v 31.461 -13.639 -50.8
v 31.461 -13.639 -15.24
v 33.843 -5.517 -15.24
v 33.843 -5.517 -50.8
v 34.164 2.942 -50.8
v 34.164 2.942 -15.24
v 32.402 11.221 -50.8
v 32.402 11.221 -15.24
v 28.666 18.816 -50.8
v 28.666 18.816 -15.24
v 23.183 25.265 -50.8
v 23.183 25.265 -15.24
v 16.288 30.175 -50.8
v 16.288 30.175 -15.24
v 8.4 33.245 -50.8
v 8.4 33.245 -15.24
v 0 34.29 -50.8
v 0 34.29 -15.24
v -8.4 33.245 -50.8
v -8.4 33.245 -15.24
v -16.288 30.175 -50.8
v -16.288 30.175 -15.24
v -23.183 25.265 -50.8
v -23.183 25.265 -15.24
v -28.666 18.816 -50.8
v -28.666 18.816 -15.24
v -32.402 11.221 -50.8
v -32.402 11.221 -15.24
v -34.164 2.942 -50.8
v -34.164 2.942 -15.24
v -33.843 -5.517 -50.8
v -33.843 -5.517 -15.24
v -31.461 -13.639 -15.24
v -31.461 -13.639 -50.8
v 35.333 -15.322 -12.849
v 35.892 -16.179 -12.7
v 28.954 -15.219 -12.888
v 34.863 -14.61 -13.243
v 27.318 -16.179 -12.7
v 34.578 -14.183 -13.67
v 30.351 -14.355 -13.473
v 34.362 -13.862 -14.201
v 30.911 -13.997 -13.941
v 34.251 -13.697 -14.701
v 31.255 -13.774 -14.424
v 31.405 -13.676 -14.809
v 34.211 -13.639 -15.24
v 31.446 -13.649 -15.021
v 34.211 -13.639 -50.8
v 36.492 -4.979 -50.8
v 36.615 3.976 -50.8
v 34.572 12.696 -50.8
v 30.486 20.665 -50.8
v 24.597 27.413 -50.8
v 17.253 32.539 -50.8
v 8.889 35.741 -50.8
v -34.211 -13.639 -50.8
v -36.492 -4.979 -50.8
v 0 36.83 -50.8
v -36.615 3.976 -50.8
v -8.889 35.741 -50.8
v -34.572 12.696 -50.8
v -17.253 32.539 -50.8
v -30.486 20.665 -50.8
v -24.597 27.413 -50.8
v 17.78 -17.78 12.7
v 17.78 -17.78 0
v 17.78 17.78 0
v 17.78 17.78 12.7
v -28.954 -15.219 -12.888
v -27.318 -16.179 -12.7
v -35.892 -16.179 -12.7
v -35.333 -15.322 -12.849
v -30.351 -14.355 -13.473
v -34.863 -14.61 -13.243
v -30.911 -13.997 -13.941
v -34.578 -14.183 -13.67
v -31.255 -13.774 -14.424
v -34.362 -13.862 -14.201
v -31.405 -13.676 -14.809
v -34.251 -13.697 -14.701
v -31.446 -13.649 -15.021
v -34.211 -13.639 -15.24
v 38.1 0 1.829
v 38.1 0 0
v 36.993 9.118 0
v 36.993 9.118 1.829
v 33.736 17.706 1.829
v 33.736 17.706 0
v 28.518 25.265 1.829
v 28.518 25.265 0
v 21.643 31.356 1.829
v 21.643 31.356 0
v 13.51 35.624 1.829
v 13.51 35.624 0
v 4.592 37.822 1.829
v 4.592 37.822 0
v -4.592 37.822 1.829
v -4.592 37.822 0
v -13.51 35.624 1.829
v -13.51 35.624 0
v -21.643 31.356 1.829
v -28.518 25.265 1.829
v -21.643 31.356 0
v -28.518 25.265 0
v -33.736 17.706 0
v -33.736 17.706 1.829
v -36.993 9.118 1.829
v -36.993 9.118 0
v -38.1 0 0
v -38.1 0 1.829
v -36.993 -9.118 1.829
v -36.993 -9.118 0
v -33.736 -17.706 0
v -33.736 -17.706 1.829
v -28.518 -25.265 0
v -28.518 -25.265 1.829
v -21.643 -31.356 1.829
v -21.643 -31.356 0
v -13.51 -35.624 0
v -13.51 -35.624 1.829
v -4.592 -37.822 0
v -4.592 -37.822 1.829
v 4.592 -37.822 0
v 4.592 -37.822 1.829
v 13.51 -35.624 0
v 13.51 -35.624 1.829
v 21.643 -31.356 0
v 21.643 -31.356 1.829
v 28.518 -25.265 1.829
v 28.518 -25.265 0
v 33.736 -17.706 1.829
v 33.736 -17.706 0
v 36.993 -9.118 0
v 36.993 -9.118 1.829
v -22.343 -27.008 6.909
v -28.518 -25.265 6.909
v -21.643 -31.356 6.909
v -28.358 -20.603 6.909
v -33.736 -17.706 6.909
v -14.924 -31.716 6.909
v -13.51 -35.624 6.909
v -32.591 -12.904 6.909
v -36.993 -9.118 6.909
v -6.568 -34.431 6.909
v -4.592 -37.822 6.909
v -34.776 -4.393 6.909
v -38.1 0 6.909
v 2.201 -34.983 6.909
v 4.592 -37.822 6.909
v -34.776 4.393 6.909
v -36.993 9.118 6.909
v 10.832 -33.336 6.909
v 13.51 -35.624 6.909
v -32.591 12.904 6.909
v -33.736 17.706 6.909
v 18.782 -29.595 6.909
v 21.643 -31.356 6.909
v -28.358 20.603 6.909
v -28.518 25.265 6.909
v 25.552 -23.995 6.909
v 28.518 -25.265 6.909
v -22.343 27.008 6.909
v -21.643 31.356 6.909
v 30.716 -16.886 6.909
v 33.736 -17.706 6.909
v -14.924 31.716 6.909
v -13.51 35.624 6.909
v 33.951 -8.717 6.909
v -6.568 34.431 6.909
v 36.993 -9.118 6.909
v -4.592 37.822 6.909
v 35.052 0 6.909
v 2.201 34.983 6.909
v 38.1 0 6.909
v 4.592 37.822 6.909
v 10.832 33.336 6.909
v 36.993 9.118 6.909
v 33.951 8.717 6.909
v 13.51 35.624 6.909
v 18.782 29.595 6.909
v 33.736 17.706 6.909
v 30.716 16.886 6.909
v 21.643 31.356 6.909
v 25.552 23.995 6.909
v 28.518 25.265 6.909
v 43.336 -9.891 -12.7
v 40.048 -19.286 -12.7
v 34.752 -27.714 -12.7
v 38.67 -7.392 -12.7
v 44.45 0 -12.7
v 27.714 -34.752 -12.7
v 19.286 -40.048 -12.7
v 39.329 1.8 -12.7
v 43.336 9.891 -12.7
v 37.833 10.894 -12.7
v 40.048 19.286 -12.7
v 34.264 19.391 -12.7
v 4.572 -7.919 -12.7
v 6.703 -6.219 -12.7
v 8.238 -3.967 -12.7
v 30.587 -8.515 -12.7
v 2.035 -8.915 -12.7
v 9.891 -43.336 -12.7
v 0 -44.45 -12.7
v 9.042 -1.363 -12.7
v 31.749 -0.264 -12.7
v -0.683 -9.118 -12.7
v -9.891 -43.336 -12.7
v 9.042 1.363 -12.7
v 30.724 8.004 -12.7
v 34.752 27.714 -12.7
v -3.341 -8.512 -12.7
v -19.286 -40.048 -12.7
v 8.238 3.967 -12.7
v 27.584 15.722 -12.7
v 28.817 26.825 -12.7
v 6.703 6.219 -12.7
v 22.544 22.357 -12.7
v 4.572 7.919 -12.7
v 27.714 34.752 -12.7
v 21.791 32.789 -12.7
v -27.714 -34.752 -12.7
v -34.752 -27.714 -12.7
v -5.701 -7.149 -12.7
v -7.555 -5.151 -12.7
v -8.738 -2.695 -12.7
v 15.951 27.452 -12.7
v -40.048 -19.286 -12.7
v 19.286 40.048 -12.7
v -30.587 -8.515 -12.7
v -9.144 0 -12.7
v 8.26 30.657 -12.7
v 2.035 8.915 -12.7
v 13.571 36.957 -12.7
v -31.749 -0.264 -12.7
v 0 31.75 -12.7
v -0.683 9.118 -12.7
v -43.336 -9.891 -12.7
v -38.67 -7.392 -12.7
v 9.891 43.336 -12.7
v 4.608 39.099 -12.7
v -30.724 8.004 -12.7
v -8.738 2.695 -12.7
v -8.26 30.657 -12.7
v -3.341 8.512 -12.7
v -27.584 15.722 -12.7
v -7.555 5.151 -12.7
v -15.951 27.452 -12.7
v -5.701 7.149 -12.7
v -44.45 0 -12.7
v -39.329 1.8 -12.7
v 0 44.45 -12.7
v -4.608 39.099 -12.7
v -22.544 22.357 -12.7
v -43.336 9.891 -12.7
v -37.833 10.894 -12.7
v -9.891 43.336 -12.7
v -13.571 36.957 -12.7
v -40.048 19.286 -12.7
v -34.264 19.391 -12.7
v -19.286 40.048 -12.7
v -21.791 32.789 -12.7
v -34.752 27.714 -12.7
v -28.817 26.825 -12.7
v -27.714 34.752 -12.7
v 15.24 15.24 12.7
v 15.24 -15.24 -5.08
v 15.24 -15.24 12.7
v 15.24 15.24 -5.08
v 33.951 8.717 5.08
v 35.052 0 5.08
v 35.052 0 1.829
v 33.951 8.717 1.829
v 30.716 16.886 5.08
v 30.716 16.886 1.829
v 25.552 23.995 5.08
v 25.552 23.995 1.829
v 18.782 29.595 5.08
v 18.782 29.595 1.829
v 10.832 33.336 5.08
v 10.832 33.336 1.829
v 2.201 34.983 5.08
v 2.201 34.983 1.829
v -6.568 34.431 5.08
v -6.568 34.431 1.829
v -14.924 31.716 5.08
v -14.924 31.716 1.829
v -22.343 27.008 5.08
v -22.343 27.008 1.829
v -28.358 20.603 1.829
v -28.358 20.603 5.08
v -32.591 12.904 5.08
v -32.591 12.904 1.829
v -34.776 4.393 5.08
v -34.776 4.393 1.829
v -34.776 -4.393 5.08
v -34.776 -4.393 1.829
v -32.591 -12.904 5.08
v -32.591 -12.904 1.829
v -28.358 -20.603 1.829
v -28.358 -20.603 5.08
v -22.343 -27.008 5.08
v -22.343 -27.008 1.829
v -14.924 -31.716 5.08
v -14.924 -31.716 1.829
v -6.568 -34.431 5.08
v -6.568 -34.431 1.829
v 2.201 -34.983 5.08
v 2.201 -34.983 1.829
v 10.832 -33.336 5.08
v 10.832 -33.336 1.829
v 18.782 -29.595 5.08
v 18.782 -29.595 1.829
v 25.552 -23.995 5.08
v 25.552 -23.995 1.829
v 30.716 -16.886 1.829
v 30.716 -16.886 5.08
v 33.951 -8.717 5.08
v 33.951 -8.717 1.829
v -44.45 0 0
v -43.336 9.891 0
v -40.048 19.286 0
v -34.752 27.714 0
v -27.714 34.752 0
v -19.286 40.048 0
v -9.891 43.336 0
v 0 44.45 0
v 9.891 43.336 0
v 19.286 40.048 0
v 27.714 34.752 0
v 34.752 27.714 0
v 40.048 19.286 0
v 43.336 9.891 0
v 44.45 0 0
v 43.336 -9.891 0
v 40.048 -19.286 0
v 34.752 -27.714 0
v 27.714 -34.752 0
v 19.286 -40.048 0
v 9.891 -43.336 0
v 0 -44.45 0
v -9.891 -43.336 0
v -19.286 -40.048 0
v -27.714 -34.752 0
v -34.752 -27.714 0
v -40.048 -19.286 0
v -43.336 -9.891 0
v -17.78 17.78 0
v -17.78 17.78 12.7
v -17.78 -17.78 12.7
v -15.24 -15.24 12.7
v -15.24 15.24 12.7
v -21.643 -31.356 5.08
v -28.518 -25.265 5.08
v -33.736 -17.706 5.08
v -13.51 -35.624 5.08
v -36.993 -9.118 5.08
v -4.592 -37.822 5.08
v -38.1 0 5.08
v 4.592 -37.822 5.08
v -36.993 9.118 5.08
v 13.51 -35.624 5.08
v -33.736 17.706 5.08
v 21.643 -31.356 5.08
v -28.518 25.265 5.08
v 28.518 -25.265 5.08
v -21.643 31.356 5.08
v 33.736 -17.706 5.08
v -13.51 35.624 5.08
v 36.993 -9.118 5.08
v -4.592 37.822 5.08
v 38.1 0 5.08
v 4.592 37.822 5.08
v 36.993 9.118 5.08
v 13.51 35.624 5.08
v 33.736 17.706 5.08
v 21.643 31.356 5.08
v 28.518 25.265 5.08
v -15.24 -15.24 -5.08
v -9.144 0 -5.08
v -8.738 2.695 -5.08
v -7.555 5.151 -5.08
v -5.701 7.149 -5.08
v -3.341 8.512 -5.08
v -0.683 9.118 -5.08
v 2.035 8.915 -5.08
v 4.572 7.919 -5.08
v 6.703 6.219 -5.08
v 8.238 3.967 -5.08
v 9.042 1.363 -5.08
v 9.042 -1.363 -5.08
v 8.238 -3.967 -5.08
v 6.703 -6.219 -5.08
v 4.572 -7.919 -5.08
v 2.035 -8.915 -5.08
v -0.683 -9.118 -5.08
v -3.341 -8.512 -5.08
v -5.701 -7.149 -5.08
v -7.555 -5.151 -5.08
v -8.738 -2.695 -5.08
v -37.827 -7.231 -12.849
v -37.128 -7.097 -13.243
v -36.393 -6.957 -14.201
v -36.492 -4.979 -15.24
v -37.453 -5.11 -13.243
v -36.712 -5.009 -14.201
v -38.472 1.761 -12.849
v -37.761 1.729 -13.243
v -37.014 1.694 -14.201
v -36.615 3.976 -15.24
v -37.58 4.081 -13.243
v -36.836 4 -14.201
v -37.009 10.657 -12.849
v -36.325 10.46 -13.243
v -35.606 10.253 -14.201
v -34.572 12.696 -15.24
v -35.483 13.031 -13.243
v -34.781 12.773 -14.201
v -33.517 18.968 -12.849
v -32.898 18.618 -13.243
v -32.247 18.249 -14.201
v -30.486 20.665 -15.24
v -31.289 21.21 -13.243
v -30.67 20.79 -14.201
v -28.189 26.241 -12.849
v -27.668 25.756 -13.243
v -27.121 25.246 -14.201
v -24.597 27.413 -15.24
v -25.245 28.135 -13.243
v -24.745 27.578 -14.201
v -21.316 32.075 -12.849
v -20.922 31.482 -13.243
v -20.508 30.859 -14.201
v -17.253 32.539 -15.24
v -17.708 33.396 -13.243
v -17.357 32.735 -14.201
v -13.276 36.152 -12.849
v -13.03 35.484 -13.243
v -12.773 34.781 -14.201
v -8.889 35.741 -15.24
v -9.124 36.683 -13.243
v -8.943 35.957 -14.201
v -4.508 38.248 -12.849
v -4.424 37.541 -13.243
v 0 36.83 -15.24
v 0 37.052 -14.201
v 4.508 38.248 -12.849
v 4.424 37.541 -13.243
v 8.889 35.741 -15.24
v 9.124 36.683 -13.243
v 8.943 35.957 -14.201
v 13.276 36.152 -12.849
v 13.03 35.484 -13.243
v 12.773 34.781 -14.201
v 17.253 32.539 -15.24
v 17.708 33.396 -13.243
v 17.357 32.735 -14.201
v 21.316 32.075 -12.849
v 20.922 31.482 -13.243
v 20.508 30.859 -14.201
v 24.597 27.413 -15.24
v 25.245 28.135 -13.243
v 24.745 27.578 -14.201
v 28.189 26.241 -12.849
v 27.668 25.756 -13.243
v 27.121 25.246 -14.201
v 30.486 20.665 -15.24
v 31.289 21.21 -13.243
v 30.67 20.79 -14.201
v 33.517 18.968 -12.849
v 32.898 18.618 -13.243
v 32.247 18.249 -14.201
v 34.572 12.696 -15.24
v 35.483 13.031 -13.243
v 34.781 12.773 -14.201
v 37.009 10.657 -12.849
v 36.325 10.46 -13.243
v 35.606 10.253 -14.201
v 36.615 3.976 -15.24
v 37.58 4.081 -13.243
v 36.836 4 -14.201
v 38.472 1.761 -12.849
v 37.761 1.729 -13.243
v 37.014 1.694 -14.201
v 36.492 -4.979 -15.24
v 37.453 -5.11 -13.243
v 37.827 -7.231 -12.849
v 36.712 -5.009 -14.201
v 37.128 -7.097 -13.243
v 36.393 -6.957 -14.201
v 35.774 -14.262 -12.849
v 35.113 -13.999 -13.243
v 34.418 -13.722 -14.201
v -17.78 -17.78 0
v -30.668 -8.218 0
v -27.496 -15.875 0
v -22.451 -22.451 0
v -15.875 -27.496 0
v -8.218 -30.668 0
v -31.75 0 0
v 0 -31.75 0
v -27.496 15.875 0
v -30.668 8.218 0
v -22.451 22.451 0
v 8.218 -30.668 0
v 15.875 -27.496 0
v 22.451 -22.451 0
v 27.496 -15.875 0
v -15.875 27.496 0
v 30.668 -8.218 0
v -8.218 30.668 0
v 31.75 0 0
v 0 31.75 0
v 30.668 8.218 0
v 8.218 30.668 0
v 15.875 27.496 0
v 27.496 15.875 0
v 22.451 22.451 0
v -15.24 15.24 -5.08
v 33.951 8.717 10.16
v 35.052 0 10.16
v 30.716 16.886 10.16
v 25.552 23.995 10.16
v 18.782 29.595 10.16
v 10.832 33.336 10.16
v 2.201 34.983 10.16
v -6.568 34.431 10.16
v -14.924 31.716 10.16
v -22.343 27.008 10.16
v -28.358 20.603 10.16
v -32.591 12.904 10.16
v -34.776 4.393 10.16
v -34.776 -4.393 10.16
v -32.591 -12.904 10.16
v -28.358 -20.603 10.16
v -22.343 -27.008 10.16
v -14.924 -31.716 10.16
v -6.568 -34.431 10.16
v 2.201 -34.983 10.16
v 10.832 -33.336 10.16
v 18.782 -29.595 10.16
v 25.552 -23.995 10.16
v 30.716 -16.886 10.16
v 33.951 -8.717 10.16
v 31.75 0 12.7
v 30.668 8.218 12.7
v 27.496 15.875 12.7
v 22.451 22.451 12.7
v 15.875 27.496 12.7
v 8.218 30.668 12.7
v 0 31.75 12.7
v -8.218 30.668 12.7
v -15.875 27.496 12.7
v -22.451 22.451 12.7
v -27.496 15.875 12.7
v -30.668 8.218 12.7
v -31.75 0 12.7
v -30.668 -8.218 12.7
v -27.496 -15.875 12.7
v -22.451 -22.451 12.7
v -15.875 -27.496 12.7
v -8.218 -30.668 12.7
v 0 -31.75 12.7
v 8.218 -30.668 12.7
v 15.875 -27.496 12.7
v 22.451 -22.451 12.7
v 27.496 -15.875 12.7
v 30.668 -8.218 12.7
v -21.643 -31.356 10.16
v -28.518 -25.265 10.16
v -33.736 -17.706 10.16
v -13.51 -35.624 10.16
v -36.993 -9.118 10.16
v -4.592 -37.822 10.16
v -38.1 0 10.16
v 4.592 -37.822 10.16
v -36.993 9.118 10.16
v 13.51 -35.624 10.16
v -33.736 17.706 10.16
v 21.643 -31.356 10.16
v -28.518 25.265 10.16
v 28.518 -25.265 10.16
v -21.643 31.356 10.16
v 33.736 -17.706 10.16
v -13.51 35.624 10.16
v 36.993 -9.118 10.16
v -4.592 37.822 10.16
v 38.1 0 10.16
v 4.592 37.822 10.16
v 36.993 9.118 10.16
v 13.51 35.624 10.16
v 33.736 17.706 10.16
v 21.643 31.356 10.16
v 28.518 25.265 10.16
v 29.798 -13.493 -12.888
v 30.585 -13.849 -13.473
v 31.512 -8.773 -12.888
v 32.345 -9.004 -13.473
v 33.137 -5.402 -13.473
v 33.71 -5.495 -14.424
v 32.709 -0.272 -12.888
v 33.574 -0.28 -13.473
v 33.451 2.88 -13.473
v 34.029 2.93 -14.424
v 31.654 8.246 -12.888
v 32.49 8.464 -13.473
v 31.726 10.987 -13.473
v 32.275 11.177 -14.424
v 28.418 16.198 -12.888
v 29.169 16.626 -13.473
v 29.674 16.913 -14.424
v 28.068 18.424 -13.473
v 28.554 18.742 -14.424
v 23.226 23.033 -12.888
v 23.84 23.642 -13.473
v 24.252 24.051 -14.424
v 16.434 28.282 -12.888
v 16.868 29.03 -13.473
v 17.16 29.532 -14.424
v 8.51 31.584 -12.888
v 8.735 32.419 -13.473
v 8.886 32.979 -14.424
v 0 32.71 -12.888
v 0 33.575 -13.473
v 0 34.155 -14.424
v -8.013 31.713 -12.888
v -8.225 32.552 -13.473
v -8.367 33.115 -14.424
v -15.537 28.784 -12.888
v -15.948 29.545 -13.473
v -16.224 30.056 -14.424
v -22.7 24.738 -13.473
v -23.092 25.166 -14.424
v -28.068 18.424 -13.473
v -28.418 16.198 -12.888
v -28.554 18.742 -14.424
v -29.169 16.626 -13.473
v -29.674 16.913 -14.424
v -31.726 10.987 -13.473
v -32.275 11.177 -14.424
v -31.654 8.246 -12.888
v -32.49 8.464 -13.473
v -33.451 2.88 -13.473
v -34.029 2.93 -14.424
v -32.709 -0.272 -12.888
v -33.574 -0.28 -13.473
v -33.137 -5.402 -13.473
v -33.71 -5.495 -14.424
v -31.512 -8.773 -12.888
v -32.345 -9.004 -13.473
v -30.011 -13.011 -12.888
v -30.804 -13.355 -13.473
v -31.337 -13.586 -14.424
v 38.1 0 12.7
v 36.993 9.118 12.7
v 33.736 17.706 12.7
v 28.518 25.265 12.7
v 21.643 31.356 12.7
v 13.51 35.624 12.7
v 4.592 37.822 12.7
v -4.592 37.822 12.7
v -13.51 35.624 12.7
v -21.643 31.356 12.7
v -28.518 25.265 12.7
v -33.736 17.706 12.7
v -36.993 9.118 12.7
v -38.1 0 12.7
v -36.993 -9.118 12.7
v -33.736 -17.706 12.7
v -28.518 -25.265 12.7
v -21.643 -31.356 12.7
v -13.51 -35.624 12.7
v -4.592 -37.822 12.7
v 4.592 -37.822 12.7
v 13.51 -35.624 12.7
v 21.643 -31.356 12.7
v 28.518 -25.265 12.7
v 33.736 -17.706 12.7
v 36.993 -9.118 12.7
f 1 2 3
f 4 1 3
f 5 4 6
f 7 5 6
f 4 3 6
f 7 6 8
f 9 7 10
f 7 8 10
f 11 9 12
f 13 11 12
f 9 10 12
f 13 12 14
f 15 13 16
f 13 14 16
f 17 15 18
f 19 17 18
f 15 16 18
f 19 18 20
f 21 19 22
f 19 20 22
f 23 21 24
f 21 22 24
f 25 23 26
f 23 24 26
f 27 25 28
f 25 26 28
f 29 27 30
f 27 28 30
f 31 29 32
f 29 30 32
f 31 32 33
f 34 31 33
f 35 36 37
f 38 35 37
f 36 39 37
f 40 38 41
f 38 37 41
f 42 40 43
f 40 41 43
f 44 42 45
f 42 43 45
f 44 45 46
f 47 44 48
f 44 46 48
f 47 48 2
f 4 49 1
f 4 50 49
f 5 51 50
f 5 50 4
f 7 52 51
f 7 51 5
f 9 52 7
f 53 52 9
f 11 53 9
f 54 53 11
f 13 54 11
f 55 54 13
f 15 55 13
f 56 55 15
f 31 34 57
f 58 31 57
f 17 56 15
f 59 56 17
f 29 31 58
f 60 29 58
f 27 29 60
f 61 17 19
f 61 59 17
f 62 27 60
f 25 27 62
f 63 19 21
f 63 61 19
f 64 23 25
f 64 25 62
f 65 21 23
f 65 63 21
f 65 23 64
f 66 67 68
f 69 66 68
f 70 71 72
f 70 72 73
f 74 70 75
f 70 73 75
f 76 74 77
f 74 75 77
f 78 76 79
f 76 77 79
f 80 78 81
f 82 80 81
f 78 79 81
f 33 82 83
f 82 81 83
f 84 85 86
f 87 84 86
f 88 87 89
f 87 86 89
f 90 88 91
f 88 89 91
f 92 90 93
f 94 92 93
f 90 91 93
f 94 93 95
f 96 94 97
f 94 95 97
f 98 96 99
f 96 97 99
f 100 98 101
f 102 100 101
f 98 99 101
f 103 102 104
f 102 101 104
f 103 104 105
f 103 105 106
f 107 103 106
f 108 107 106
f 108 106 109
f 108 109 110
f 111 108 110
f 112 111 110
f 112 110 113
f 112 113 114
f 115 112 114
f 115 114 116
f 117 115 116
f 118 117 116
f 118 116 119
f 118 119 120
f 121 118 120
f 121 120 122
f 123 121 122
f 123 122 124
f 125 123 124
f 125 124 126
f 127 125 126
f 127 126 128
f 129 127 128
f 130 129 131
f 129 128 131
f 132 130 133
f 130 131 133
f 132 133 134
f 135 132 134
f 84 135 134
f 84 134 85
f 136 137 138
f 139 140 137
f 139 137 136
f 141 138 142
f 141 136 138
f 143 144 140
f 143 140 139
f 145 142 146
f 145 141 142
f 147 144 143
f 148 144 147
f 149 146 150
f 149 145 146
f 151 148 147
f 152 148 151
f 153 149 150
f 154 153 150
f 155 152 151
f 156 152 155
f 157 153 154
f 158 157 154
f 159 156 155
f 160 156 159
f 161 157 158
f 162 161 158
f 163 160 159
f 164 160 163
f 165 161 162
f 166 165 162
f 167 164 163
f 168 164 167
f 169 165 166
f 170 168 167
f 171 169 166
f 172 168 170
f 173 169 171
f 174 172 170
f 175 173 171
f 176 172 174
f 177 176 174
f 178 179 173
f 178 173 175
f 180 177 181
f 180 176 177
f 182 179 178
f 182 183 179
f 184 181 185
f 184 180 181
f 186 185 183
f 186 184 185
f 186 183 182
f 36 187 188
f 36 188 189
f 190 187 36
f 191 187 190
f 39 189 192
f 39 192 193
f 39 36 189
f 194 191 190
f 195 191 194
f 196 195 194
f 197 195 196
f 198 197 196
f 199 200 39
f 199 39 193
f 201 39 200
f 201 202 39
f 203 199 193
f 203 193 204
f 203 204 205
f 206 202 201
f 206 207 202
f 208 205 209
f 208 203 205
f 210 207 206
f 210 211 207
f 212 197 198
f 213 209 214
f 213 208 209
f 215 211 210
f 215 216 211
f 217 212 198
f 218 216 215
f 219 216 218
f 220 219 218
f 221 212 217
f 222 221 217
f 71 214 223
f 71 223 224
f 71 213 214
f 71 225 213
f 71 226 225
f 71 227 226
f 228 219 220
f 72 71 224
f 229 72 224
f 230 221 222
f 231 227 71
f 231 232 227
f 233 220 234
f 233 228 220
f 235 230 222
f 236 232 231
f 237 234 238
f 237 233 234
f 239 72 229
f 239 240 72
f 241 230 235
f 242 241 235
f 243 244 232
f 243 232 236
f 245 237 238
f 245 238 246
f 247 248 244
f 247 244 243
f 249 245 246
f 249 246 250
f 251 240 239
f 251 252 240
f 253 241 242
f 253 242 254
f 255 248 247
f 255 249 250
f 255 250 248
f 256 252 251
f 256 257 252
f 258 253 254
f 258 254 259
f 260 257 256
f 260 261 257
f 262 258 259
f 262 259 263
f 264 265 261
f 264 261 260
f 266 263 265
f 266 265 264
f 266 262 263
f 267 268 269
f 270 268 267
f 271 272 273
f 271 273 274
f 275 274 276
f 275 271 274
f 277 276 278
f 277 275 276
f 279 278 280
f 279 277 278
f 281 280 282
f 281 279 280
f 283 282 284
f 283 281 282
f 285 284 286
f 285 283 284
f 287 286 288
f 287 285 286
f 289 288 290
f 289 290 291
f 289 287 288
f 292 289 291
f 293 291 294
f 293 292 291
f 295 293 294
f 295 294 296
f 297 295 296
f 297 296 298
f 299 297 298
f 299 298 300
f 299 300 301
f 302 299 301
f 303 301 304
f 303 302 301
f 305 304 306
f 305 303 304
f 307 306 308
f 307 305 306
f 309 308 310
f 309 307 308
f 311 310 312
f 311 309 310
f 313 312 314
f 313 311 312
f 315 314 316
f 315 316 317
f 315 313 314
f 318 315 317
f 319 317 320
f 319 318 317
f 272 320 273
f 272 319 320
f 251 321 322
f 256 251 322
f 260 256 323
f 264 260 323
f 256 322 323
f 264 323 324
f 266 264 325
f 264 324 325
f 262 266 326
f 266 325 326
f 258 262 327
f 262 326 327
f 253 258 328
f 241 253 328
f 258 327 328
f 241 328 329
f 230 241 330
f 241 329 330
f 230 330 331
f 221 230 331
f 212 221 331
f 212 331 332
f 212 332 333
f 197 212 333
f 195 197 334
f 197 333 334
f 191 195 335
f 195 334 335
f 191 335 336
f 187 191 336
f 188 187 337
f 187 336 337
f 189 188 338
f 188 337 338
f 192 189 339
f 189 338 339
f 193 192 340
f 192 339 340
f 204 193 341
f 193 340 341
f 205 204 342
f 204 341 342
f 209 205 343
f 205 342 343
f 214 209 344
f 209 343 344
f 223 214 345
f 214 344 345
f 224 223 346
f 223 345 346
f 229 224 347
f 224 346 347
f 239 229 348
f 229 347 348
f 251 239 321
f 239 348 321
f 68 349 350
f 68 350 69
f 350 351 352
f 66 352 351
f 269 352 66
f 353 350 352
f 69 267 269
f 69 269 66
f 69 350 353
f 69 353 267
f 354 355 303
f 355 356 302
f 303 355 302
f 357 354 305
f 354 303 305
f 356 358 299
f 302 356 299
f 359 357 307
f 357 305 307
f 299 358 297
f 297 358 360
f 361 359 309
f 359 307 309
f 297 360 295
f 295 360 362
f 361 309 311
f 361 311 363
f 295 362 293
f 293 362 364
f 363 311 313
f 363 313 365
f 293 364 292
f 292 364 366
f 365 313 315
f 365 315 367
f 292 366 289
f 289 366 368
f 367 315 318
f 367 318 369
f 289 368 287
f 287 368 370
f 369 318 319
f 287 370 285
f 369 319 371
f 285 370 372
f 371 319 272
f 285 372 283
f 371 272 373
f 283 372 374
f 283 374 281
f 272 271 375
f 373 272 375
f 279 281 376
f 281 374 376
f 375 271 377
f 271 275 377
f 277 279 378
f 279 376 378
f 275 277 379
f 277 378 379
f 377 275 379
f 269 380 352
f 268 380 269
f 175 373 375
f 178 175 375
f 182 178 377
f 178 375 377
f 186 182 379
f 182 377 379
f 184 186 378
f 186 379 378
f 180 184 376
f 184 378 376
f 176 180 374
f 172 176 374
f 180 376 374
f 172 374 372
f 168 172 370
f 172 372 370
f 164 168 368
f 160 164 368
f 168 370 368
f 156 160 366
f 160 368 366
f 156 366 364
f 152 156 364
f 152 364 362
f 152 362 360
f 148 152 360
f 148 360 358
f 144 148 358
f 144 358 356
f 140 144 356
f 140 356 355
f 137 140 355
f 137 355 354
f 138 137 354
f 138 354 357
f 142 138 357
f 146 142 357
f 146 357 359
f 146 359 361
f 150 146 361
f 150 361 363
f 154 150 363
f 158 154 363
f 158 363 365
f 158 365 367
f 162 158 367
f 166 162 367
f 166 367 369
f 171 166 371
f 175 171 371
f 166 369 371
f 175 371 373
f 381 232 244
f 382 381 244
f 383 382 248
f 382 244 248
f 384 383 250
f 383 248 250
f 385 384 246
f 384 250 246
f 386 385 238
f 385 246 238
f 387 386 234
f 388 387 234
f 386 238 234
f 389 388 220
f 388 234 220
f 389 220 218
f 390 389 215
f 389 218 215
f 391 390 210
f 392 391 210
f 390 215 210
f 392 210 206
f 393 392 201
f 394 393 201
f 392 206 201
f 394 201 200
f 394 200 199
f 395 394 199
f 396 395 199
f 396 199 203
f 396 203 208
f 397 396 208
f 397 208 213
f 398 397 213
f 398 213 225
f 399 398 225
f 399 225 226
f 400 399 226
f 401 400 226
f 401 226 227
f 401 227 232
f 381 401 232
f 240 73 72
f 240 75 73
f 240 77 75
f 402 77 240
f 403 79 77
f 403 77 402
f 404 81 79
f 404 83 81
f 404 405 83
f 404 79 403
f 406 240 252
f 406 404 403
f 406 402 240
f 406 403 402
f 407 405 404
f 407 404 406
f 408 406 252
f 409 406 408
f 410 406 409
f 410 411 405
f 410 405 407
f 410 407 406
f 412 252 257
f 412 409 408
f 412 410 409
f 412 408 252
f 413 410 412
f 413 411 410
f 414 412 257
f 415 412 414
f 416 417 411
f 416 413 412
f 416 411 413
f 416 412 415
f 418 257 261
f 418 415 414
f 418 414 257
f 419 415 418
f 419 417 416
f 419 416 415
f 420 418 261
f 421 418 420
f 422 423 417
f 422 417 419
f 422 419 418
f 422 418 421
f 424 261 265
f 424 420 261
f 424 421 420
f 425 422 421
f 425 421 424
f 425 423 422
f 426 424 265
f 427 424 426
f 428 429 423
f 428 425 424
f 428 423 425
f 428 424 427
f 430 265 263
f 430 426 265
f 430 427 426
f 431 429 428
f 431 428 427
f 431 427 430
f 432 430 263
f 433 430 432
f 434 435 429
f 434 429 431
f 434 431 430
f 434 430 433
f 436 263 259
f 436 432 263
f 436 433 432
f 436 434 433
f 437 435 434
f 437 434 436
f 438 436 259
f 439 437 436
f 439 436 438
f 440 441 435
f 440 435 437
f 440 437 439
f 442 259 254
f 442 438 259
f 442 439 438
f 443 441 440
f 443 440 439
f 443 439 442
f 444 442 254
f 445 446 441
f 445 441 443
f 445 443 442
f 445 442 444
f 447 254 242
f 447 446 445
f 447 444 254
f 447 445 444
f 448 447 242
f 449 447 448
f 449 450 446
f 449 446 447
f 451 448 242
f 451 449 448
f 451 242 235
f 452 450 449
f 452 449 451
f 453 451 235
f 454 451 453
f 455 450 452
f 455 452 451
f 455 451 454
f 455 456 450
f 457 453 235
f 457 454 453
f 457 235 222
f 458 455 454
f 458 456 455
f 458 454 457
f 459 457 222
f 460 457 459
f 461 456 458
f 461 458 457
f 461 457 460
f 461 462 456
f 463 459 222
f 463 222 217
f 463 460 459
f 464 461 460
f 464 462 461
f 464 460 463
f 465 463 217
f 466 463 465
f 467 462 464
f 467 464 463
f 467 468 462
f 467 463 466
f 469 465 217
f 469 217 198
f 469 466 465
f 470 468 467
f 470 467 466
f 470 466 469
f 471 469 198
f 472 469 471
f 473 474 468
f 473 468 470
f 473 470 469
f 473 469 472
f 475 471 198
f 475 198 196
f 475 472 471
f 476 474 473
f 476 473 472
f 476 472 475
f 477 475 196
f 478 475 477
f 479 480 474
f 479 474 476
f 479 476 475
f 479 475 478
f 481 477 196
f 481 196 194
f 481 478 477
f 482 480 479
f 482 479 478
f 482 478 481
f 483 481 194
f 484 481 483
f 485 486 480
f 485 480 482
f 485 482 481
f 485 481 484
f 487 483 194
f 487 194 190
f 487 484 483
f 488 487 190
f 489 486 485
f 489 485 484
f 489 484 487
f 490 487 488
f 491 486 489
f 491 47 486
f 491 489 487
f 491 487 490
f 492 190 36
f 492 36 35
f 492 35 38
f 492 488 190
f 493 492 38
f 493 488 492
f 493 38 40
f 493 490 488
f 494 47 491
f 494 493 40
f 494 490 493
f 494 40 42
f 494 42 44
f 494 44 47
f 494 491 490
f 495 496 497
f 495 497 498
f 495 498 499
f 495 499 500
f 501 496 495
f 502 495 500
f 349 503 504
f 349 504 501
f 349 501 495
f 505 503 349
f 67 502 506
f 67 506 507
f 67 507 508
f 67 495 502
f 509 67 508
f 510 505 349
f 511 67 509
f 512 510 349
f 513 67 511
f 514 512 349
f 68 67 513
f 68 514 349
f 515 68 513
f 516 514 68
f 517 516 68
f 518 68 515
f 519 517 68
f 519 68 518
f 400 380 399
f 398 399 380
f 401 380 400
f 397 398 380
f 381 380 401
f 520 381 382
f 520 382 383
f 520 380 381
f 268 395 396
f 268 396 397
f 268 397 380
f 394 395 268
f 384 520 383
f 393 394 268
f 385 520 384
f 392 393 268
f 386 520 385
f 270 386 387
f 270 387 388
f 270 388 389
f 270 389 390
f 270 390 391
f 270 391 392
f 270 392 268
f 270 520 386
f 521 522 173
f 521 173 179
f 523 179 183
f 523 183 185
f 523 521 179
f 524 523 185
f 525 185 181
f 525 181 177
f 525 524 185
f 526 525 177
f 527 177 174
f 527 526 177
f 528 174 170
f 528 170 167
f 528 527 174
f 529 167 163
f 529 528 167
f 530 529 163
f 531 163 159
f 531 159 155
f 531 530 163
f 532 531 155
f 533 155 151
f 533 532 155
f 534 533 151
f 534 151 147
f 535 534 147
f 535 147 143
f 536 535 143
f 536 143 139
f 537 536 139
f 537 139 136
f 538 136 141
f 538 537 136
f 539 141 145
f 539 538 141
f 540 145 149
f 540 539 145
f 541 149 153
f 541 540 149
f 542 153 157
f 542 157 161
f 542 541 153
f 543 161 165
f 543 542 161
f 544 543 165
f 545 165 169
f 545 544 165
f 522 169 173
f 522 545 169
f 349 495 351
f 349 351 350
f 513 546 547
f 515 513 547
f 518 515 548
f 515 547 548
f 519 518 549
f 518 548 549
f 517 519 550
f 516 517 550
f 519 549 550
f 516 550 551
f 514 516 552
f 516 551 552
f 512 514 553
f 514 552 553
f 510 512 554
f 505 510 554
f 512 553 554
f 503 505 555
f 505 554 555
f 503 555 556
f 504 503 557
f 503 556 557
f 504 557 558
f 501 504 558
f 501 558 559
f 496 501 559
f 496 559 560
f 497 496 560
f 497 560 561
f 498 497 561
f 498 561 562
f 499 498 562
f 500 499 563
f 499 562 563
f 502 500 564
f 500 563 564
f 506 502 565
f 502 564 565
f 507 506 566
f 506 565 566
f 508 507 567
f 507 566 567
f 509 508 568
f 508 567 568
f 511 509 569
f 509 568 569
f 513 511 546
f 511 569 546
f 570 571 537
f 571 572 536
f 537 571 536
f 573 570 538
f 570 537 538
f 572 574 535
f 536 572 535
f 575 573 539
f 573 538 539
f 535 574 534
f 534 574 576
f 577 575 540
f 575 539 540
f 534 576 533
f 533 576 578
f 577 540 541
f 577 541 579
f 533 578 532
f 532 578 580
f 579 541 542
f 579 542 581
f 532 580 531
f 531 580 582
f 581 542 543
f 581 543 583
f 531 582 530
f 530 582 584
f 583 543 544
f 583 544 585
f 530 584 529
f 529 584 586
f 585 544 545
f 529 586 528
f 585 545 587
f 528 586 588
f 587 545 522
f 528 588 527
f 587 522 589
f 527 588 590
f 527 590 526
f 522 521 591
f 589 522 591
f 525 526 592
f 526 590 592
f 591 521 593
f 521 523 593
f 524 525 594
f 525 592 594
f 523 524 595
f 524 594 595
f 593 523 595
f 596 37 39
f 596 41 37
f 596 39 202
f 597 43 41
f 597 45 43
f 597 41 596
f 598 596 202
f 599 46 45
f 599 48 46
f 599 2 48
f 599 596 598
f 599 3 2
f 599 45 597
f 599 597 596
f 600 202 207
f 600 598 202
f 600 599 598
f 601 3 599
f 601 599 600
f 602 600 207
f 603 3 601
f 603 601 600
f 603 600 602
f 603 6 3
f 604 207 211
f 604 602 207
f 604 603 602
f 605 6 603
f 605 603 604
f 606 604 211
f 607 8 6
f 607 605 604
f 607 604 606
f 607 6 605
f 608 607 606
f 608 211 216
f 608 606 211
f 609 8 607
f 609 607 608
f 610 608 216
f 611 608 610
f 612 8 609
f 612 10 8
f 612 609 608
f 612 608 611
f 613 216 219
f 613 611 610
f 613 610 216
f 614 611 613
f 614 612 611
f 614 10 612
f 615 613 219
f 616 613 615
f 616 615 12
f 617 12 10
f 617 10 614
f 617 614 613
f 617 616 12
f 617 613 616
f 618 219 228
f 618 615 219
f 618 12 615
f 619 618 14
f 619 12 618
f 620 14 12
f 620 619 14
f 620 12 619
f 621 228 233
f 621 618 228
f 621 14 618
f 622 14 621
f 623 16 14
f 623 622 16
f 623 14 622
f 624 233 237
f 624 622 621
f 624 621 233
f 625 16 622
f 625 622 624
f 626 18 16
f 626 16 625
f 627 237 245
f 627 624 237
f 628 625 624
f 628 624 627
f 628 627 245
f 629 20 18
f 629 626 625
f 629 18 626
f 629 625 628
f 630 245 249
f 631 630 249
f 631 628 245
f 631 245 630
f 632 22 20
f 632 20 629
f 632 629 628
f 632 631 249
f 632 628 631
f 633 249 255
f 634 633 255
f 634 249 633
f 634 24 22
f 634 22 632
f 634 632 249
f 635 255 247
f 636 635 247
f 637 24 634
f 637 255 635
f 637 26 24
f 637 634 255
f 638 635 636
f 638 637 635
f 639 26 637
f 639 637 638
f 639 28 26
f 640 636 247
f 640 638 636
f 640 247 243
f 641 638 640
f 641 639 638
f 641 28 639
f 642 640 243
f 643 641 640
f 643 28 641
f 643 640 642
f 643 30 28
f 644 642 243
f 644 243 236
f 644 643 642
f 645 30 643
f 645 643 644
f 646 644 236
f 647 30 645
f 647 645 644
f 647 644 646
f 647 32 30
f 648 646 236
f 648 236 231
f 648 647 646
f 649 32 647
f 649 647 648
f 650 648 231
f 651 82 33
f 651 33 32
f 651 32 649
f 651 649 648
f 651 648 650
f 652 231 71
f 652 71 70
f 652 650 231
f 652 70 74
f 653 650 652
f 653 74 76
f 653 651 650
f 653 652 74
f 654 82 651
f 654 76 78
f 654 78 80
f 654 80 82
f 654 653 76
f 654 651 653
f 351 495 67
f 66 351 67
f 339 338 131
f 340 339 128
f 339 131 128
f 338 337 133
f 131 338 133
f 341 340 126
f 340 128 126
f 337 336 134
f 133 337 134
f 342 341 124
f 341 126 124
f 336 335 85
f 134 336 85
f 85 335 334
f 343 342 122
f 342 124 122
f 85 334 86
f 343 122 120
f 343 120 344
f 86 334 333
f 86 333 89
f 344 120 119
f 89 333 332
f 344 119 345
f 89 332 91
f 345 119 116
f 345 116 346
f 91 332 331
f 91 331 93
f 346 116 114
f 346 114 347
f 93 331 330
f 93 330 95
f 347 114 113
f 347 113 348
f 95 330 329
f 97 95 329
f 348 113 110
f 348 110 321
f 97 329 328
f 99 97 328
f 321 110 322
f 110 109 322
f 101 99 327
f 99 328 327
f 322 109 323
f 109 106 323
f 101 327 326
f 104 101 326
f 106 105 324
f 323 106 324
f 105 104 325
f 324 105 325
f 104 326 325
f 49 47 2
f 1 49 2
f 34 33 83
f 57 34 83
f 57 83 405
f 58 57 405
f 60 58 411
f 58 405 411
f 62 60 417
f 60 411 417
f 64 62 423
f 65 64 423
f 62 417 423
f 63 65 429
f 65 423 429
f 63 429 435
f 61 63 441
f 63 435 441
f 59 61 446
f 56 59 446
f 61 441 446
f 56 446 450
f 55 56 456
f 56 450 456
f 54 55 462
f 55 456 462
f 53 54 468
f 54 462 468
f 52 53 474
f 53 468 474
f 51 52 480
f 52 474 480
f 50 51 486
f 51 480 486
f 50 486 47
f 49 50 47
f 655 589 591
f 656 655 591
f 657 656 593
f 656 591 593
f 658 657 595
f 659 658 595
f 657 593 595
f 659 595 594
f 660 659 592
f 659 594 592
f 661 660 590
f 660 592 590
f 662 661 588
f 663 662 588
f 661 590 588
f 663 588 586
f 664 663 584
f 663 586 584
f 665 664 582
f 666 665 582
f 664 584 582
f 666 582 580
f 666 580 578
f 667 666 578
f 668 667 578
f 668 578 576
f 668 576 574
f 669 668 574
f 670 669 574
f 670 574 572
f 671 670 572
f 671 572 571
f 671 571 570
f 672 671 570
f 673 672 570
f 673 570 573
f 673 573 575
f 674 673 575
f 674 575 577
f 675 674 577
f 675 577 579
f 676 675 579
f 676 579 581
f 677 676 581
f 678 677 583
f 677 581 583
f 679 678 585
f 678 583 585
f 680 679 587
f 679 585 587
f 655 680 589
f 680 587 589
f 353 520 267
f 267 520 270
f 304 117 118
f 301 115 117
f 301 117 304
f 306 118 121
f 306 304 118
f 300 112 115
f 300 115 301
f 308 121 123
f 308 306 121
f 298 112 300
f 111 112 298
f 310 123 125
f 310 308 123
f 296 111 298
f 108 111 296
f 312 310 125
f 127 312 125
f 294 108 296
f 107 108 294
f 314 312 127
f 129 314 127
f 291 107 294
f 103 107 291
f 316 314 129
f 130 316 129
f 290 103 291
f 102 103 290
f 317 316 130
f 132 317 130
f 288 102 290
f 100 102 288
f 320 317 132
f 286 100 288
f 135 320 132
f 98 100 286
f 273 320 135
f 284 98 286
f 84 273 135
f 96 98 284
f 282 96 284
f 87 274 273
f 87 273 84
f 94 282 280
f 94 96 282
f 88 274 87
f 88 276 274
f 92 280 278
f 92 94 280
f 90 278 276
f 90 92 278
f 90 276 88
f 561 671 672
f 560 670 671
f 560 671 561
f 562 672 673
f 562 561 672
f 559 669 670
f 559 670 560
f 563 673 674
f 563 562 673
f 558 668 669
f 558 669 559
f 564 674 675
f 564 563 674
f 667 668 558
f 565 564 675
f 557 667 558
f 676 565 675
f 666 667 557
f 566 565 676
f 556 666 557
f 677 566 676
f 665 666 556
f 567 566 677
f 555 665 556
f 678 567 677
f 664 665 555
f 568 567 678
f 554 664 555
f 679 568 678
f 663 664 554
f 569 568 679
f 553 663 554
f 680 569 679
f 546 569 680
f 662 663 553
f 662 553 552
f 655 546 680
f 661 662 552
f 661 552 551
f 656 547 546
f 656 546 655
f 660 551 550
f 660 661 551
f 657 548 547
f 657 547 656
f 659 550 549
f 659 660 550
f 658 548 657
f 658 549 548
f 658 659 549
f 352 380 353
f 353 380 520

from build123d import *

# Parameters (mm, degrees)
SKETCH1_R           = 38.1
BOSS_EXTRUDE1_DEPTH = 12.7
SKETCH3_R           = 44.45
BOSS_EXTRUDE2_DEPTH = 12.7
SKETCH4_R           = 9.144
CUT_EXTRUDE1_DEPTH  = 26.4
SKETCH5_W           = 30.48
SKETCH5_H           = 30.48
CUT_EXTRUDE2_DEPTH  = 17.78
SKETCH6_R           = 31.75
CUT_EXTRUDE3_DEPTH  = 12.7
BOSS_EXTRUDE3_DEPTH = 38.1
CUT_EXTRUDE4_START  = -2.54
SKETCH8_R           = 38.1
SKETCH8_R_2         = 35.052
CUT_EXTRUDE4_DEPTH  = 3.2512
CUT_EXTRUDE5_START  = -7.62
SKETCH9_R           = 38.1
SKETCH9_R_2         = 35.052
CUT_EXTRUDE5_DEPTH  = 3.2512
FILLET1_R           = 2.54
SKETCH10_W          = 35.56
SKETCH10_H          = 35.56
SKETCH10_W_2        = 30.48
SKETCH10_H_2        = 30.48
BOSS_EXTRUDE4_DEPTH = 12.7


with BuildPart() as part:
    # Sketch1 → Boss-Extrude1 (new body)
    with BuildSketch(Plane.XY):
        Circle(SKETCH1_R)
    extrude(amount=BOSS_EXTRUDE1_DEPTH)

    # Sketch3 → Boss-Extrude2 (add)
    with BuildSketch(Plane(origin=(0, 0, 0), x_dir=(-1, 0, 0), z_dir=(0, 0, -1))):
        Circle(SKETCH3_R)
    extrude(amount=BOSS_EXTRUDE2_DEPTH)

    # Sketch4 → Cut-Extrude1 (cut, through all)
    with BuildSketch(Plane(origin=(0, 0, -12.7), x_dir=(-1, 0, 0), z_dir=(0, 0, -1))):
        Circle(SKETCH4_R)
    extrude(amount=-CUT_EXTRUDE1_DEPTH, mode=Mode.SUBTRACT)

    # Sketch5 → Cut-Extrude2 (cut)
    with BuildSketch(Plane.XY.offset(12.7)):
        Rectangle(SKETCH5_W, SKETCH5_H)
    extrude(amount=-CUT_EXTRUDE2_DEPTH, mode=Mode.SUBTRACT)

    # Sketch6 → Cut-Extrude3 (cut)
    with BuildSketch(Plane.XY.offset(12.7)):
        Circle(SKETCH6_R)
    extrude(amount=-CUT_EXTRUDE3_DEPTH, mode=Mode.SUBTRACT)

    # Sketch7 → Boss-Extrude3 (add)
    with BuildSketch(Plane(origin=(0, 0, -12.7), x_dir=(-1, 0, 0), z_dir=(0, 0, -1))):
        with BuildLine():
            Line((-34.21134801, -13.639375622), (-31.460634651, -13.639375622))
            ThreePointArc((-31.460634651, -13.639375622), (0, 34.29), (31.460634651, -13.639375622))
            Line((31.460634651, -13.639375622), (34.21134801, -13.639375622))
            ThreePointArc((34.21134801, -13.639375622), (0, 36.83), (-34.21134801, -13.639375622))
        make_face()
    extrude(amount=BOSS_EXTRUDE3_DEPTH)

    # Sketch8 → Cut-Extrude4 (cut)
    with BuildSketch(Plane.XY.offset(12.7).offset(CUT_EXTRUDE4_START)):
        Circle(SKETCH8_R)
        Circle(SKETCH8_R_2, mode=Mode.SUBTRACT)
    extrude(amount=-CUT_EXTRUDE4_DEPTH, mode=Mode.SUBTRACT)

    # Sketch9 → Cut-Extrude5 (cut)
    with BuildSketch(Plane.XY.offset(12.7).offset(CUT_EXTRUDE5_START)):
        Circle(SKETCH9_R)
        Circle(SKETCH9_R_2, mode=Mode.SUBTRACT)
    extrude(amount=-CUT_EXTRUDE5_DEPTH, mode=Mode.SUBTRACT)

    # Fillet1
    fillet1_edges = [part.edges().sort_by_distance(p)[0] for p in [
        (0, 36.83, -12.7),
        (32.835991331, -13.639375622, -12.7),
        (0, 34.29, -12.7),
        (-32.835991331, -13.639375622, -12.7),
    ]]
    fillet(fillet1_edges, radius=FILLET1_R)

    # Sketch10 → Boss-Extrude4 (add)
    with BuildSketch(Plane.XY):
        Rectangle(SKETCH10_W, SKETCH10_H)
        Rectangle(SKETCH10_W_2, SKETCH10_H_2, mode=Mode.SUBTRACT)
    extrude(amount=BOSS_EXTRUDE4_DEPTH)


solid = part.part
